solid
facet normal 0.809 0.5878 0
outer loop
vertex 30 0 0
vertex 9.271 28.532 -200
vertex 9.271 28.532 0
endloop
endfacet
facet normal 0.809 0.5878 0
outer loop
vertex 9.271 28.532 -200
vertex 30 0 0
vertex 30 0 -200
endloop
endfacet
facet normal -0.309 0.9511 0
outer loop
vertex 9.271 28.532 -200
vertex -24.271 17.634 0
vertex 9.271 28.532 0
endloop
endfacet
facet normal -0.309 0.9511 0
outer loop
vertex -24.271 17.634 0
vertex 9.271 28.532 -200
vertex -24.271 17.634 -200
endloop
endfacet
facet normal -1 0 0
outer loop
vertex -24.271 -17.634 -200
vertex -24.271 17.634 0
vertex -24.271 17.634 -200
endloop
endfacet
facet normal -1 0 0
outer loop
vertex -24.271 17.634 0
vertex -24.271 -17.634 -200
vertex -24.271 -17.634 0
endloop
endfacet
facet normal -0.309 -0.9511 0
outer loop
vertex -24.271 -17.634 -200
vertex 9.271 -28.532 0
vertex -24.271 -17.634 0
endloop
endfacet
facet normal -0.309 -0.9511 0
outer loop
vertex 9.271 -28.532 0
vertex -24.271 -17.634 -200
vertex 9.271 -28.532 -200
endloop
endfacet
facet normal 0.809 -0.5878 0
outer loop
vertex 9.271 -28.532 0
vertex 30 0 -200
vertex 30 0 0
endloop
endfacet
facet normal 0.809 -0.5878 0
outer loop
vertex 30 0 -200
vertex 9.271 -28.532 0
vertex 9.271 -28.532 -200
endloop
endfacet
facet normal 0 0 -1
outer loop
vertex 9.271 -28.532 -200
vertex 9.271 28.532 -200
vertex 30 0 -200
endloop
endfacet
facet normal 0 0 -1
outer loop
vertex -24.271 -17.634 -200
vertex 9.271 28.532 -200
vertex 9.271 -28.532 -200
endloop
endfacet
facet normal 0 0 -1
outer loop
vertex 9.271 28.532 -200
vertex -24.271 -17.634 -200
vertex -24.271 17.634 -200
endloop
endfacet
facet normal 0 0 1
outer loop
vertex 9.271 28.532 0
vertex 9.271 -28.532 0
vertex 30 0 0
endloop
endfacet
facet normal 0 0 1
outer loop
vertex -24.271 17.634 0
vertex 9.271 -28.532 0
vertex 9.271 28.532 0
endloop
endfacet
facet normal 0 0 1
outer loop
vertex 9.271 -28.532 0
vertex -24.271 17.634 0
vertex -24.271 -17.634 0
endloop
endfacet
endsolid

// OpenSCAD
// trackable shape
module obsHandle(width=30, length=100, facets=5)
{
	translate([0,0,-length])
		cylinder(r1=width, r2=width, h=length, $fn=facets);
}

handleLength=200;
handleWidth=30;
obsHandle(width=handleWidth, length=handleLength);
